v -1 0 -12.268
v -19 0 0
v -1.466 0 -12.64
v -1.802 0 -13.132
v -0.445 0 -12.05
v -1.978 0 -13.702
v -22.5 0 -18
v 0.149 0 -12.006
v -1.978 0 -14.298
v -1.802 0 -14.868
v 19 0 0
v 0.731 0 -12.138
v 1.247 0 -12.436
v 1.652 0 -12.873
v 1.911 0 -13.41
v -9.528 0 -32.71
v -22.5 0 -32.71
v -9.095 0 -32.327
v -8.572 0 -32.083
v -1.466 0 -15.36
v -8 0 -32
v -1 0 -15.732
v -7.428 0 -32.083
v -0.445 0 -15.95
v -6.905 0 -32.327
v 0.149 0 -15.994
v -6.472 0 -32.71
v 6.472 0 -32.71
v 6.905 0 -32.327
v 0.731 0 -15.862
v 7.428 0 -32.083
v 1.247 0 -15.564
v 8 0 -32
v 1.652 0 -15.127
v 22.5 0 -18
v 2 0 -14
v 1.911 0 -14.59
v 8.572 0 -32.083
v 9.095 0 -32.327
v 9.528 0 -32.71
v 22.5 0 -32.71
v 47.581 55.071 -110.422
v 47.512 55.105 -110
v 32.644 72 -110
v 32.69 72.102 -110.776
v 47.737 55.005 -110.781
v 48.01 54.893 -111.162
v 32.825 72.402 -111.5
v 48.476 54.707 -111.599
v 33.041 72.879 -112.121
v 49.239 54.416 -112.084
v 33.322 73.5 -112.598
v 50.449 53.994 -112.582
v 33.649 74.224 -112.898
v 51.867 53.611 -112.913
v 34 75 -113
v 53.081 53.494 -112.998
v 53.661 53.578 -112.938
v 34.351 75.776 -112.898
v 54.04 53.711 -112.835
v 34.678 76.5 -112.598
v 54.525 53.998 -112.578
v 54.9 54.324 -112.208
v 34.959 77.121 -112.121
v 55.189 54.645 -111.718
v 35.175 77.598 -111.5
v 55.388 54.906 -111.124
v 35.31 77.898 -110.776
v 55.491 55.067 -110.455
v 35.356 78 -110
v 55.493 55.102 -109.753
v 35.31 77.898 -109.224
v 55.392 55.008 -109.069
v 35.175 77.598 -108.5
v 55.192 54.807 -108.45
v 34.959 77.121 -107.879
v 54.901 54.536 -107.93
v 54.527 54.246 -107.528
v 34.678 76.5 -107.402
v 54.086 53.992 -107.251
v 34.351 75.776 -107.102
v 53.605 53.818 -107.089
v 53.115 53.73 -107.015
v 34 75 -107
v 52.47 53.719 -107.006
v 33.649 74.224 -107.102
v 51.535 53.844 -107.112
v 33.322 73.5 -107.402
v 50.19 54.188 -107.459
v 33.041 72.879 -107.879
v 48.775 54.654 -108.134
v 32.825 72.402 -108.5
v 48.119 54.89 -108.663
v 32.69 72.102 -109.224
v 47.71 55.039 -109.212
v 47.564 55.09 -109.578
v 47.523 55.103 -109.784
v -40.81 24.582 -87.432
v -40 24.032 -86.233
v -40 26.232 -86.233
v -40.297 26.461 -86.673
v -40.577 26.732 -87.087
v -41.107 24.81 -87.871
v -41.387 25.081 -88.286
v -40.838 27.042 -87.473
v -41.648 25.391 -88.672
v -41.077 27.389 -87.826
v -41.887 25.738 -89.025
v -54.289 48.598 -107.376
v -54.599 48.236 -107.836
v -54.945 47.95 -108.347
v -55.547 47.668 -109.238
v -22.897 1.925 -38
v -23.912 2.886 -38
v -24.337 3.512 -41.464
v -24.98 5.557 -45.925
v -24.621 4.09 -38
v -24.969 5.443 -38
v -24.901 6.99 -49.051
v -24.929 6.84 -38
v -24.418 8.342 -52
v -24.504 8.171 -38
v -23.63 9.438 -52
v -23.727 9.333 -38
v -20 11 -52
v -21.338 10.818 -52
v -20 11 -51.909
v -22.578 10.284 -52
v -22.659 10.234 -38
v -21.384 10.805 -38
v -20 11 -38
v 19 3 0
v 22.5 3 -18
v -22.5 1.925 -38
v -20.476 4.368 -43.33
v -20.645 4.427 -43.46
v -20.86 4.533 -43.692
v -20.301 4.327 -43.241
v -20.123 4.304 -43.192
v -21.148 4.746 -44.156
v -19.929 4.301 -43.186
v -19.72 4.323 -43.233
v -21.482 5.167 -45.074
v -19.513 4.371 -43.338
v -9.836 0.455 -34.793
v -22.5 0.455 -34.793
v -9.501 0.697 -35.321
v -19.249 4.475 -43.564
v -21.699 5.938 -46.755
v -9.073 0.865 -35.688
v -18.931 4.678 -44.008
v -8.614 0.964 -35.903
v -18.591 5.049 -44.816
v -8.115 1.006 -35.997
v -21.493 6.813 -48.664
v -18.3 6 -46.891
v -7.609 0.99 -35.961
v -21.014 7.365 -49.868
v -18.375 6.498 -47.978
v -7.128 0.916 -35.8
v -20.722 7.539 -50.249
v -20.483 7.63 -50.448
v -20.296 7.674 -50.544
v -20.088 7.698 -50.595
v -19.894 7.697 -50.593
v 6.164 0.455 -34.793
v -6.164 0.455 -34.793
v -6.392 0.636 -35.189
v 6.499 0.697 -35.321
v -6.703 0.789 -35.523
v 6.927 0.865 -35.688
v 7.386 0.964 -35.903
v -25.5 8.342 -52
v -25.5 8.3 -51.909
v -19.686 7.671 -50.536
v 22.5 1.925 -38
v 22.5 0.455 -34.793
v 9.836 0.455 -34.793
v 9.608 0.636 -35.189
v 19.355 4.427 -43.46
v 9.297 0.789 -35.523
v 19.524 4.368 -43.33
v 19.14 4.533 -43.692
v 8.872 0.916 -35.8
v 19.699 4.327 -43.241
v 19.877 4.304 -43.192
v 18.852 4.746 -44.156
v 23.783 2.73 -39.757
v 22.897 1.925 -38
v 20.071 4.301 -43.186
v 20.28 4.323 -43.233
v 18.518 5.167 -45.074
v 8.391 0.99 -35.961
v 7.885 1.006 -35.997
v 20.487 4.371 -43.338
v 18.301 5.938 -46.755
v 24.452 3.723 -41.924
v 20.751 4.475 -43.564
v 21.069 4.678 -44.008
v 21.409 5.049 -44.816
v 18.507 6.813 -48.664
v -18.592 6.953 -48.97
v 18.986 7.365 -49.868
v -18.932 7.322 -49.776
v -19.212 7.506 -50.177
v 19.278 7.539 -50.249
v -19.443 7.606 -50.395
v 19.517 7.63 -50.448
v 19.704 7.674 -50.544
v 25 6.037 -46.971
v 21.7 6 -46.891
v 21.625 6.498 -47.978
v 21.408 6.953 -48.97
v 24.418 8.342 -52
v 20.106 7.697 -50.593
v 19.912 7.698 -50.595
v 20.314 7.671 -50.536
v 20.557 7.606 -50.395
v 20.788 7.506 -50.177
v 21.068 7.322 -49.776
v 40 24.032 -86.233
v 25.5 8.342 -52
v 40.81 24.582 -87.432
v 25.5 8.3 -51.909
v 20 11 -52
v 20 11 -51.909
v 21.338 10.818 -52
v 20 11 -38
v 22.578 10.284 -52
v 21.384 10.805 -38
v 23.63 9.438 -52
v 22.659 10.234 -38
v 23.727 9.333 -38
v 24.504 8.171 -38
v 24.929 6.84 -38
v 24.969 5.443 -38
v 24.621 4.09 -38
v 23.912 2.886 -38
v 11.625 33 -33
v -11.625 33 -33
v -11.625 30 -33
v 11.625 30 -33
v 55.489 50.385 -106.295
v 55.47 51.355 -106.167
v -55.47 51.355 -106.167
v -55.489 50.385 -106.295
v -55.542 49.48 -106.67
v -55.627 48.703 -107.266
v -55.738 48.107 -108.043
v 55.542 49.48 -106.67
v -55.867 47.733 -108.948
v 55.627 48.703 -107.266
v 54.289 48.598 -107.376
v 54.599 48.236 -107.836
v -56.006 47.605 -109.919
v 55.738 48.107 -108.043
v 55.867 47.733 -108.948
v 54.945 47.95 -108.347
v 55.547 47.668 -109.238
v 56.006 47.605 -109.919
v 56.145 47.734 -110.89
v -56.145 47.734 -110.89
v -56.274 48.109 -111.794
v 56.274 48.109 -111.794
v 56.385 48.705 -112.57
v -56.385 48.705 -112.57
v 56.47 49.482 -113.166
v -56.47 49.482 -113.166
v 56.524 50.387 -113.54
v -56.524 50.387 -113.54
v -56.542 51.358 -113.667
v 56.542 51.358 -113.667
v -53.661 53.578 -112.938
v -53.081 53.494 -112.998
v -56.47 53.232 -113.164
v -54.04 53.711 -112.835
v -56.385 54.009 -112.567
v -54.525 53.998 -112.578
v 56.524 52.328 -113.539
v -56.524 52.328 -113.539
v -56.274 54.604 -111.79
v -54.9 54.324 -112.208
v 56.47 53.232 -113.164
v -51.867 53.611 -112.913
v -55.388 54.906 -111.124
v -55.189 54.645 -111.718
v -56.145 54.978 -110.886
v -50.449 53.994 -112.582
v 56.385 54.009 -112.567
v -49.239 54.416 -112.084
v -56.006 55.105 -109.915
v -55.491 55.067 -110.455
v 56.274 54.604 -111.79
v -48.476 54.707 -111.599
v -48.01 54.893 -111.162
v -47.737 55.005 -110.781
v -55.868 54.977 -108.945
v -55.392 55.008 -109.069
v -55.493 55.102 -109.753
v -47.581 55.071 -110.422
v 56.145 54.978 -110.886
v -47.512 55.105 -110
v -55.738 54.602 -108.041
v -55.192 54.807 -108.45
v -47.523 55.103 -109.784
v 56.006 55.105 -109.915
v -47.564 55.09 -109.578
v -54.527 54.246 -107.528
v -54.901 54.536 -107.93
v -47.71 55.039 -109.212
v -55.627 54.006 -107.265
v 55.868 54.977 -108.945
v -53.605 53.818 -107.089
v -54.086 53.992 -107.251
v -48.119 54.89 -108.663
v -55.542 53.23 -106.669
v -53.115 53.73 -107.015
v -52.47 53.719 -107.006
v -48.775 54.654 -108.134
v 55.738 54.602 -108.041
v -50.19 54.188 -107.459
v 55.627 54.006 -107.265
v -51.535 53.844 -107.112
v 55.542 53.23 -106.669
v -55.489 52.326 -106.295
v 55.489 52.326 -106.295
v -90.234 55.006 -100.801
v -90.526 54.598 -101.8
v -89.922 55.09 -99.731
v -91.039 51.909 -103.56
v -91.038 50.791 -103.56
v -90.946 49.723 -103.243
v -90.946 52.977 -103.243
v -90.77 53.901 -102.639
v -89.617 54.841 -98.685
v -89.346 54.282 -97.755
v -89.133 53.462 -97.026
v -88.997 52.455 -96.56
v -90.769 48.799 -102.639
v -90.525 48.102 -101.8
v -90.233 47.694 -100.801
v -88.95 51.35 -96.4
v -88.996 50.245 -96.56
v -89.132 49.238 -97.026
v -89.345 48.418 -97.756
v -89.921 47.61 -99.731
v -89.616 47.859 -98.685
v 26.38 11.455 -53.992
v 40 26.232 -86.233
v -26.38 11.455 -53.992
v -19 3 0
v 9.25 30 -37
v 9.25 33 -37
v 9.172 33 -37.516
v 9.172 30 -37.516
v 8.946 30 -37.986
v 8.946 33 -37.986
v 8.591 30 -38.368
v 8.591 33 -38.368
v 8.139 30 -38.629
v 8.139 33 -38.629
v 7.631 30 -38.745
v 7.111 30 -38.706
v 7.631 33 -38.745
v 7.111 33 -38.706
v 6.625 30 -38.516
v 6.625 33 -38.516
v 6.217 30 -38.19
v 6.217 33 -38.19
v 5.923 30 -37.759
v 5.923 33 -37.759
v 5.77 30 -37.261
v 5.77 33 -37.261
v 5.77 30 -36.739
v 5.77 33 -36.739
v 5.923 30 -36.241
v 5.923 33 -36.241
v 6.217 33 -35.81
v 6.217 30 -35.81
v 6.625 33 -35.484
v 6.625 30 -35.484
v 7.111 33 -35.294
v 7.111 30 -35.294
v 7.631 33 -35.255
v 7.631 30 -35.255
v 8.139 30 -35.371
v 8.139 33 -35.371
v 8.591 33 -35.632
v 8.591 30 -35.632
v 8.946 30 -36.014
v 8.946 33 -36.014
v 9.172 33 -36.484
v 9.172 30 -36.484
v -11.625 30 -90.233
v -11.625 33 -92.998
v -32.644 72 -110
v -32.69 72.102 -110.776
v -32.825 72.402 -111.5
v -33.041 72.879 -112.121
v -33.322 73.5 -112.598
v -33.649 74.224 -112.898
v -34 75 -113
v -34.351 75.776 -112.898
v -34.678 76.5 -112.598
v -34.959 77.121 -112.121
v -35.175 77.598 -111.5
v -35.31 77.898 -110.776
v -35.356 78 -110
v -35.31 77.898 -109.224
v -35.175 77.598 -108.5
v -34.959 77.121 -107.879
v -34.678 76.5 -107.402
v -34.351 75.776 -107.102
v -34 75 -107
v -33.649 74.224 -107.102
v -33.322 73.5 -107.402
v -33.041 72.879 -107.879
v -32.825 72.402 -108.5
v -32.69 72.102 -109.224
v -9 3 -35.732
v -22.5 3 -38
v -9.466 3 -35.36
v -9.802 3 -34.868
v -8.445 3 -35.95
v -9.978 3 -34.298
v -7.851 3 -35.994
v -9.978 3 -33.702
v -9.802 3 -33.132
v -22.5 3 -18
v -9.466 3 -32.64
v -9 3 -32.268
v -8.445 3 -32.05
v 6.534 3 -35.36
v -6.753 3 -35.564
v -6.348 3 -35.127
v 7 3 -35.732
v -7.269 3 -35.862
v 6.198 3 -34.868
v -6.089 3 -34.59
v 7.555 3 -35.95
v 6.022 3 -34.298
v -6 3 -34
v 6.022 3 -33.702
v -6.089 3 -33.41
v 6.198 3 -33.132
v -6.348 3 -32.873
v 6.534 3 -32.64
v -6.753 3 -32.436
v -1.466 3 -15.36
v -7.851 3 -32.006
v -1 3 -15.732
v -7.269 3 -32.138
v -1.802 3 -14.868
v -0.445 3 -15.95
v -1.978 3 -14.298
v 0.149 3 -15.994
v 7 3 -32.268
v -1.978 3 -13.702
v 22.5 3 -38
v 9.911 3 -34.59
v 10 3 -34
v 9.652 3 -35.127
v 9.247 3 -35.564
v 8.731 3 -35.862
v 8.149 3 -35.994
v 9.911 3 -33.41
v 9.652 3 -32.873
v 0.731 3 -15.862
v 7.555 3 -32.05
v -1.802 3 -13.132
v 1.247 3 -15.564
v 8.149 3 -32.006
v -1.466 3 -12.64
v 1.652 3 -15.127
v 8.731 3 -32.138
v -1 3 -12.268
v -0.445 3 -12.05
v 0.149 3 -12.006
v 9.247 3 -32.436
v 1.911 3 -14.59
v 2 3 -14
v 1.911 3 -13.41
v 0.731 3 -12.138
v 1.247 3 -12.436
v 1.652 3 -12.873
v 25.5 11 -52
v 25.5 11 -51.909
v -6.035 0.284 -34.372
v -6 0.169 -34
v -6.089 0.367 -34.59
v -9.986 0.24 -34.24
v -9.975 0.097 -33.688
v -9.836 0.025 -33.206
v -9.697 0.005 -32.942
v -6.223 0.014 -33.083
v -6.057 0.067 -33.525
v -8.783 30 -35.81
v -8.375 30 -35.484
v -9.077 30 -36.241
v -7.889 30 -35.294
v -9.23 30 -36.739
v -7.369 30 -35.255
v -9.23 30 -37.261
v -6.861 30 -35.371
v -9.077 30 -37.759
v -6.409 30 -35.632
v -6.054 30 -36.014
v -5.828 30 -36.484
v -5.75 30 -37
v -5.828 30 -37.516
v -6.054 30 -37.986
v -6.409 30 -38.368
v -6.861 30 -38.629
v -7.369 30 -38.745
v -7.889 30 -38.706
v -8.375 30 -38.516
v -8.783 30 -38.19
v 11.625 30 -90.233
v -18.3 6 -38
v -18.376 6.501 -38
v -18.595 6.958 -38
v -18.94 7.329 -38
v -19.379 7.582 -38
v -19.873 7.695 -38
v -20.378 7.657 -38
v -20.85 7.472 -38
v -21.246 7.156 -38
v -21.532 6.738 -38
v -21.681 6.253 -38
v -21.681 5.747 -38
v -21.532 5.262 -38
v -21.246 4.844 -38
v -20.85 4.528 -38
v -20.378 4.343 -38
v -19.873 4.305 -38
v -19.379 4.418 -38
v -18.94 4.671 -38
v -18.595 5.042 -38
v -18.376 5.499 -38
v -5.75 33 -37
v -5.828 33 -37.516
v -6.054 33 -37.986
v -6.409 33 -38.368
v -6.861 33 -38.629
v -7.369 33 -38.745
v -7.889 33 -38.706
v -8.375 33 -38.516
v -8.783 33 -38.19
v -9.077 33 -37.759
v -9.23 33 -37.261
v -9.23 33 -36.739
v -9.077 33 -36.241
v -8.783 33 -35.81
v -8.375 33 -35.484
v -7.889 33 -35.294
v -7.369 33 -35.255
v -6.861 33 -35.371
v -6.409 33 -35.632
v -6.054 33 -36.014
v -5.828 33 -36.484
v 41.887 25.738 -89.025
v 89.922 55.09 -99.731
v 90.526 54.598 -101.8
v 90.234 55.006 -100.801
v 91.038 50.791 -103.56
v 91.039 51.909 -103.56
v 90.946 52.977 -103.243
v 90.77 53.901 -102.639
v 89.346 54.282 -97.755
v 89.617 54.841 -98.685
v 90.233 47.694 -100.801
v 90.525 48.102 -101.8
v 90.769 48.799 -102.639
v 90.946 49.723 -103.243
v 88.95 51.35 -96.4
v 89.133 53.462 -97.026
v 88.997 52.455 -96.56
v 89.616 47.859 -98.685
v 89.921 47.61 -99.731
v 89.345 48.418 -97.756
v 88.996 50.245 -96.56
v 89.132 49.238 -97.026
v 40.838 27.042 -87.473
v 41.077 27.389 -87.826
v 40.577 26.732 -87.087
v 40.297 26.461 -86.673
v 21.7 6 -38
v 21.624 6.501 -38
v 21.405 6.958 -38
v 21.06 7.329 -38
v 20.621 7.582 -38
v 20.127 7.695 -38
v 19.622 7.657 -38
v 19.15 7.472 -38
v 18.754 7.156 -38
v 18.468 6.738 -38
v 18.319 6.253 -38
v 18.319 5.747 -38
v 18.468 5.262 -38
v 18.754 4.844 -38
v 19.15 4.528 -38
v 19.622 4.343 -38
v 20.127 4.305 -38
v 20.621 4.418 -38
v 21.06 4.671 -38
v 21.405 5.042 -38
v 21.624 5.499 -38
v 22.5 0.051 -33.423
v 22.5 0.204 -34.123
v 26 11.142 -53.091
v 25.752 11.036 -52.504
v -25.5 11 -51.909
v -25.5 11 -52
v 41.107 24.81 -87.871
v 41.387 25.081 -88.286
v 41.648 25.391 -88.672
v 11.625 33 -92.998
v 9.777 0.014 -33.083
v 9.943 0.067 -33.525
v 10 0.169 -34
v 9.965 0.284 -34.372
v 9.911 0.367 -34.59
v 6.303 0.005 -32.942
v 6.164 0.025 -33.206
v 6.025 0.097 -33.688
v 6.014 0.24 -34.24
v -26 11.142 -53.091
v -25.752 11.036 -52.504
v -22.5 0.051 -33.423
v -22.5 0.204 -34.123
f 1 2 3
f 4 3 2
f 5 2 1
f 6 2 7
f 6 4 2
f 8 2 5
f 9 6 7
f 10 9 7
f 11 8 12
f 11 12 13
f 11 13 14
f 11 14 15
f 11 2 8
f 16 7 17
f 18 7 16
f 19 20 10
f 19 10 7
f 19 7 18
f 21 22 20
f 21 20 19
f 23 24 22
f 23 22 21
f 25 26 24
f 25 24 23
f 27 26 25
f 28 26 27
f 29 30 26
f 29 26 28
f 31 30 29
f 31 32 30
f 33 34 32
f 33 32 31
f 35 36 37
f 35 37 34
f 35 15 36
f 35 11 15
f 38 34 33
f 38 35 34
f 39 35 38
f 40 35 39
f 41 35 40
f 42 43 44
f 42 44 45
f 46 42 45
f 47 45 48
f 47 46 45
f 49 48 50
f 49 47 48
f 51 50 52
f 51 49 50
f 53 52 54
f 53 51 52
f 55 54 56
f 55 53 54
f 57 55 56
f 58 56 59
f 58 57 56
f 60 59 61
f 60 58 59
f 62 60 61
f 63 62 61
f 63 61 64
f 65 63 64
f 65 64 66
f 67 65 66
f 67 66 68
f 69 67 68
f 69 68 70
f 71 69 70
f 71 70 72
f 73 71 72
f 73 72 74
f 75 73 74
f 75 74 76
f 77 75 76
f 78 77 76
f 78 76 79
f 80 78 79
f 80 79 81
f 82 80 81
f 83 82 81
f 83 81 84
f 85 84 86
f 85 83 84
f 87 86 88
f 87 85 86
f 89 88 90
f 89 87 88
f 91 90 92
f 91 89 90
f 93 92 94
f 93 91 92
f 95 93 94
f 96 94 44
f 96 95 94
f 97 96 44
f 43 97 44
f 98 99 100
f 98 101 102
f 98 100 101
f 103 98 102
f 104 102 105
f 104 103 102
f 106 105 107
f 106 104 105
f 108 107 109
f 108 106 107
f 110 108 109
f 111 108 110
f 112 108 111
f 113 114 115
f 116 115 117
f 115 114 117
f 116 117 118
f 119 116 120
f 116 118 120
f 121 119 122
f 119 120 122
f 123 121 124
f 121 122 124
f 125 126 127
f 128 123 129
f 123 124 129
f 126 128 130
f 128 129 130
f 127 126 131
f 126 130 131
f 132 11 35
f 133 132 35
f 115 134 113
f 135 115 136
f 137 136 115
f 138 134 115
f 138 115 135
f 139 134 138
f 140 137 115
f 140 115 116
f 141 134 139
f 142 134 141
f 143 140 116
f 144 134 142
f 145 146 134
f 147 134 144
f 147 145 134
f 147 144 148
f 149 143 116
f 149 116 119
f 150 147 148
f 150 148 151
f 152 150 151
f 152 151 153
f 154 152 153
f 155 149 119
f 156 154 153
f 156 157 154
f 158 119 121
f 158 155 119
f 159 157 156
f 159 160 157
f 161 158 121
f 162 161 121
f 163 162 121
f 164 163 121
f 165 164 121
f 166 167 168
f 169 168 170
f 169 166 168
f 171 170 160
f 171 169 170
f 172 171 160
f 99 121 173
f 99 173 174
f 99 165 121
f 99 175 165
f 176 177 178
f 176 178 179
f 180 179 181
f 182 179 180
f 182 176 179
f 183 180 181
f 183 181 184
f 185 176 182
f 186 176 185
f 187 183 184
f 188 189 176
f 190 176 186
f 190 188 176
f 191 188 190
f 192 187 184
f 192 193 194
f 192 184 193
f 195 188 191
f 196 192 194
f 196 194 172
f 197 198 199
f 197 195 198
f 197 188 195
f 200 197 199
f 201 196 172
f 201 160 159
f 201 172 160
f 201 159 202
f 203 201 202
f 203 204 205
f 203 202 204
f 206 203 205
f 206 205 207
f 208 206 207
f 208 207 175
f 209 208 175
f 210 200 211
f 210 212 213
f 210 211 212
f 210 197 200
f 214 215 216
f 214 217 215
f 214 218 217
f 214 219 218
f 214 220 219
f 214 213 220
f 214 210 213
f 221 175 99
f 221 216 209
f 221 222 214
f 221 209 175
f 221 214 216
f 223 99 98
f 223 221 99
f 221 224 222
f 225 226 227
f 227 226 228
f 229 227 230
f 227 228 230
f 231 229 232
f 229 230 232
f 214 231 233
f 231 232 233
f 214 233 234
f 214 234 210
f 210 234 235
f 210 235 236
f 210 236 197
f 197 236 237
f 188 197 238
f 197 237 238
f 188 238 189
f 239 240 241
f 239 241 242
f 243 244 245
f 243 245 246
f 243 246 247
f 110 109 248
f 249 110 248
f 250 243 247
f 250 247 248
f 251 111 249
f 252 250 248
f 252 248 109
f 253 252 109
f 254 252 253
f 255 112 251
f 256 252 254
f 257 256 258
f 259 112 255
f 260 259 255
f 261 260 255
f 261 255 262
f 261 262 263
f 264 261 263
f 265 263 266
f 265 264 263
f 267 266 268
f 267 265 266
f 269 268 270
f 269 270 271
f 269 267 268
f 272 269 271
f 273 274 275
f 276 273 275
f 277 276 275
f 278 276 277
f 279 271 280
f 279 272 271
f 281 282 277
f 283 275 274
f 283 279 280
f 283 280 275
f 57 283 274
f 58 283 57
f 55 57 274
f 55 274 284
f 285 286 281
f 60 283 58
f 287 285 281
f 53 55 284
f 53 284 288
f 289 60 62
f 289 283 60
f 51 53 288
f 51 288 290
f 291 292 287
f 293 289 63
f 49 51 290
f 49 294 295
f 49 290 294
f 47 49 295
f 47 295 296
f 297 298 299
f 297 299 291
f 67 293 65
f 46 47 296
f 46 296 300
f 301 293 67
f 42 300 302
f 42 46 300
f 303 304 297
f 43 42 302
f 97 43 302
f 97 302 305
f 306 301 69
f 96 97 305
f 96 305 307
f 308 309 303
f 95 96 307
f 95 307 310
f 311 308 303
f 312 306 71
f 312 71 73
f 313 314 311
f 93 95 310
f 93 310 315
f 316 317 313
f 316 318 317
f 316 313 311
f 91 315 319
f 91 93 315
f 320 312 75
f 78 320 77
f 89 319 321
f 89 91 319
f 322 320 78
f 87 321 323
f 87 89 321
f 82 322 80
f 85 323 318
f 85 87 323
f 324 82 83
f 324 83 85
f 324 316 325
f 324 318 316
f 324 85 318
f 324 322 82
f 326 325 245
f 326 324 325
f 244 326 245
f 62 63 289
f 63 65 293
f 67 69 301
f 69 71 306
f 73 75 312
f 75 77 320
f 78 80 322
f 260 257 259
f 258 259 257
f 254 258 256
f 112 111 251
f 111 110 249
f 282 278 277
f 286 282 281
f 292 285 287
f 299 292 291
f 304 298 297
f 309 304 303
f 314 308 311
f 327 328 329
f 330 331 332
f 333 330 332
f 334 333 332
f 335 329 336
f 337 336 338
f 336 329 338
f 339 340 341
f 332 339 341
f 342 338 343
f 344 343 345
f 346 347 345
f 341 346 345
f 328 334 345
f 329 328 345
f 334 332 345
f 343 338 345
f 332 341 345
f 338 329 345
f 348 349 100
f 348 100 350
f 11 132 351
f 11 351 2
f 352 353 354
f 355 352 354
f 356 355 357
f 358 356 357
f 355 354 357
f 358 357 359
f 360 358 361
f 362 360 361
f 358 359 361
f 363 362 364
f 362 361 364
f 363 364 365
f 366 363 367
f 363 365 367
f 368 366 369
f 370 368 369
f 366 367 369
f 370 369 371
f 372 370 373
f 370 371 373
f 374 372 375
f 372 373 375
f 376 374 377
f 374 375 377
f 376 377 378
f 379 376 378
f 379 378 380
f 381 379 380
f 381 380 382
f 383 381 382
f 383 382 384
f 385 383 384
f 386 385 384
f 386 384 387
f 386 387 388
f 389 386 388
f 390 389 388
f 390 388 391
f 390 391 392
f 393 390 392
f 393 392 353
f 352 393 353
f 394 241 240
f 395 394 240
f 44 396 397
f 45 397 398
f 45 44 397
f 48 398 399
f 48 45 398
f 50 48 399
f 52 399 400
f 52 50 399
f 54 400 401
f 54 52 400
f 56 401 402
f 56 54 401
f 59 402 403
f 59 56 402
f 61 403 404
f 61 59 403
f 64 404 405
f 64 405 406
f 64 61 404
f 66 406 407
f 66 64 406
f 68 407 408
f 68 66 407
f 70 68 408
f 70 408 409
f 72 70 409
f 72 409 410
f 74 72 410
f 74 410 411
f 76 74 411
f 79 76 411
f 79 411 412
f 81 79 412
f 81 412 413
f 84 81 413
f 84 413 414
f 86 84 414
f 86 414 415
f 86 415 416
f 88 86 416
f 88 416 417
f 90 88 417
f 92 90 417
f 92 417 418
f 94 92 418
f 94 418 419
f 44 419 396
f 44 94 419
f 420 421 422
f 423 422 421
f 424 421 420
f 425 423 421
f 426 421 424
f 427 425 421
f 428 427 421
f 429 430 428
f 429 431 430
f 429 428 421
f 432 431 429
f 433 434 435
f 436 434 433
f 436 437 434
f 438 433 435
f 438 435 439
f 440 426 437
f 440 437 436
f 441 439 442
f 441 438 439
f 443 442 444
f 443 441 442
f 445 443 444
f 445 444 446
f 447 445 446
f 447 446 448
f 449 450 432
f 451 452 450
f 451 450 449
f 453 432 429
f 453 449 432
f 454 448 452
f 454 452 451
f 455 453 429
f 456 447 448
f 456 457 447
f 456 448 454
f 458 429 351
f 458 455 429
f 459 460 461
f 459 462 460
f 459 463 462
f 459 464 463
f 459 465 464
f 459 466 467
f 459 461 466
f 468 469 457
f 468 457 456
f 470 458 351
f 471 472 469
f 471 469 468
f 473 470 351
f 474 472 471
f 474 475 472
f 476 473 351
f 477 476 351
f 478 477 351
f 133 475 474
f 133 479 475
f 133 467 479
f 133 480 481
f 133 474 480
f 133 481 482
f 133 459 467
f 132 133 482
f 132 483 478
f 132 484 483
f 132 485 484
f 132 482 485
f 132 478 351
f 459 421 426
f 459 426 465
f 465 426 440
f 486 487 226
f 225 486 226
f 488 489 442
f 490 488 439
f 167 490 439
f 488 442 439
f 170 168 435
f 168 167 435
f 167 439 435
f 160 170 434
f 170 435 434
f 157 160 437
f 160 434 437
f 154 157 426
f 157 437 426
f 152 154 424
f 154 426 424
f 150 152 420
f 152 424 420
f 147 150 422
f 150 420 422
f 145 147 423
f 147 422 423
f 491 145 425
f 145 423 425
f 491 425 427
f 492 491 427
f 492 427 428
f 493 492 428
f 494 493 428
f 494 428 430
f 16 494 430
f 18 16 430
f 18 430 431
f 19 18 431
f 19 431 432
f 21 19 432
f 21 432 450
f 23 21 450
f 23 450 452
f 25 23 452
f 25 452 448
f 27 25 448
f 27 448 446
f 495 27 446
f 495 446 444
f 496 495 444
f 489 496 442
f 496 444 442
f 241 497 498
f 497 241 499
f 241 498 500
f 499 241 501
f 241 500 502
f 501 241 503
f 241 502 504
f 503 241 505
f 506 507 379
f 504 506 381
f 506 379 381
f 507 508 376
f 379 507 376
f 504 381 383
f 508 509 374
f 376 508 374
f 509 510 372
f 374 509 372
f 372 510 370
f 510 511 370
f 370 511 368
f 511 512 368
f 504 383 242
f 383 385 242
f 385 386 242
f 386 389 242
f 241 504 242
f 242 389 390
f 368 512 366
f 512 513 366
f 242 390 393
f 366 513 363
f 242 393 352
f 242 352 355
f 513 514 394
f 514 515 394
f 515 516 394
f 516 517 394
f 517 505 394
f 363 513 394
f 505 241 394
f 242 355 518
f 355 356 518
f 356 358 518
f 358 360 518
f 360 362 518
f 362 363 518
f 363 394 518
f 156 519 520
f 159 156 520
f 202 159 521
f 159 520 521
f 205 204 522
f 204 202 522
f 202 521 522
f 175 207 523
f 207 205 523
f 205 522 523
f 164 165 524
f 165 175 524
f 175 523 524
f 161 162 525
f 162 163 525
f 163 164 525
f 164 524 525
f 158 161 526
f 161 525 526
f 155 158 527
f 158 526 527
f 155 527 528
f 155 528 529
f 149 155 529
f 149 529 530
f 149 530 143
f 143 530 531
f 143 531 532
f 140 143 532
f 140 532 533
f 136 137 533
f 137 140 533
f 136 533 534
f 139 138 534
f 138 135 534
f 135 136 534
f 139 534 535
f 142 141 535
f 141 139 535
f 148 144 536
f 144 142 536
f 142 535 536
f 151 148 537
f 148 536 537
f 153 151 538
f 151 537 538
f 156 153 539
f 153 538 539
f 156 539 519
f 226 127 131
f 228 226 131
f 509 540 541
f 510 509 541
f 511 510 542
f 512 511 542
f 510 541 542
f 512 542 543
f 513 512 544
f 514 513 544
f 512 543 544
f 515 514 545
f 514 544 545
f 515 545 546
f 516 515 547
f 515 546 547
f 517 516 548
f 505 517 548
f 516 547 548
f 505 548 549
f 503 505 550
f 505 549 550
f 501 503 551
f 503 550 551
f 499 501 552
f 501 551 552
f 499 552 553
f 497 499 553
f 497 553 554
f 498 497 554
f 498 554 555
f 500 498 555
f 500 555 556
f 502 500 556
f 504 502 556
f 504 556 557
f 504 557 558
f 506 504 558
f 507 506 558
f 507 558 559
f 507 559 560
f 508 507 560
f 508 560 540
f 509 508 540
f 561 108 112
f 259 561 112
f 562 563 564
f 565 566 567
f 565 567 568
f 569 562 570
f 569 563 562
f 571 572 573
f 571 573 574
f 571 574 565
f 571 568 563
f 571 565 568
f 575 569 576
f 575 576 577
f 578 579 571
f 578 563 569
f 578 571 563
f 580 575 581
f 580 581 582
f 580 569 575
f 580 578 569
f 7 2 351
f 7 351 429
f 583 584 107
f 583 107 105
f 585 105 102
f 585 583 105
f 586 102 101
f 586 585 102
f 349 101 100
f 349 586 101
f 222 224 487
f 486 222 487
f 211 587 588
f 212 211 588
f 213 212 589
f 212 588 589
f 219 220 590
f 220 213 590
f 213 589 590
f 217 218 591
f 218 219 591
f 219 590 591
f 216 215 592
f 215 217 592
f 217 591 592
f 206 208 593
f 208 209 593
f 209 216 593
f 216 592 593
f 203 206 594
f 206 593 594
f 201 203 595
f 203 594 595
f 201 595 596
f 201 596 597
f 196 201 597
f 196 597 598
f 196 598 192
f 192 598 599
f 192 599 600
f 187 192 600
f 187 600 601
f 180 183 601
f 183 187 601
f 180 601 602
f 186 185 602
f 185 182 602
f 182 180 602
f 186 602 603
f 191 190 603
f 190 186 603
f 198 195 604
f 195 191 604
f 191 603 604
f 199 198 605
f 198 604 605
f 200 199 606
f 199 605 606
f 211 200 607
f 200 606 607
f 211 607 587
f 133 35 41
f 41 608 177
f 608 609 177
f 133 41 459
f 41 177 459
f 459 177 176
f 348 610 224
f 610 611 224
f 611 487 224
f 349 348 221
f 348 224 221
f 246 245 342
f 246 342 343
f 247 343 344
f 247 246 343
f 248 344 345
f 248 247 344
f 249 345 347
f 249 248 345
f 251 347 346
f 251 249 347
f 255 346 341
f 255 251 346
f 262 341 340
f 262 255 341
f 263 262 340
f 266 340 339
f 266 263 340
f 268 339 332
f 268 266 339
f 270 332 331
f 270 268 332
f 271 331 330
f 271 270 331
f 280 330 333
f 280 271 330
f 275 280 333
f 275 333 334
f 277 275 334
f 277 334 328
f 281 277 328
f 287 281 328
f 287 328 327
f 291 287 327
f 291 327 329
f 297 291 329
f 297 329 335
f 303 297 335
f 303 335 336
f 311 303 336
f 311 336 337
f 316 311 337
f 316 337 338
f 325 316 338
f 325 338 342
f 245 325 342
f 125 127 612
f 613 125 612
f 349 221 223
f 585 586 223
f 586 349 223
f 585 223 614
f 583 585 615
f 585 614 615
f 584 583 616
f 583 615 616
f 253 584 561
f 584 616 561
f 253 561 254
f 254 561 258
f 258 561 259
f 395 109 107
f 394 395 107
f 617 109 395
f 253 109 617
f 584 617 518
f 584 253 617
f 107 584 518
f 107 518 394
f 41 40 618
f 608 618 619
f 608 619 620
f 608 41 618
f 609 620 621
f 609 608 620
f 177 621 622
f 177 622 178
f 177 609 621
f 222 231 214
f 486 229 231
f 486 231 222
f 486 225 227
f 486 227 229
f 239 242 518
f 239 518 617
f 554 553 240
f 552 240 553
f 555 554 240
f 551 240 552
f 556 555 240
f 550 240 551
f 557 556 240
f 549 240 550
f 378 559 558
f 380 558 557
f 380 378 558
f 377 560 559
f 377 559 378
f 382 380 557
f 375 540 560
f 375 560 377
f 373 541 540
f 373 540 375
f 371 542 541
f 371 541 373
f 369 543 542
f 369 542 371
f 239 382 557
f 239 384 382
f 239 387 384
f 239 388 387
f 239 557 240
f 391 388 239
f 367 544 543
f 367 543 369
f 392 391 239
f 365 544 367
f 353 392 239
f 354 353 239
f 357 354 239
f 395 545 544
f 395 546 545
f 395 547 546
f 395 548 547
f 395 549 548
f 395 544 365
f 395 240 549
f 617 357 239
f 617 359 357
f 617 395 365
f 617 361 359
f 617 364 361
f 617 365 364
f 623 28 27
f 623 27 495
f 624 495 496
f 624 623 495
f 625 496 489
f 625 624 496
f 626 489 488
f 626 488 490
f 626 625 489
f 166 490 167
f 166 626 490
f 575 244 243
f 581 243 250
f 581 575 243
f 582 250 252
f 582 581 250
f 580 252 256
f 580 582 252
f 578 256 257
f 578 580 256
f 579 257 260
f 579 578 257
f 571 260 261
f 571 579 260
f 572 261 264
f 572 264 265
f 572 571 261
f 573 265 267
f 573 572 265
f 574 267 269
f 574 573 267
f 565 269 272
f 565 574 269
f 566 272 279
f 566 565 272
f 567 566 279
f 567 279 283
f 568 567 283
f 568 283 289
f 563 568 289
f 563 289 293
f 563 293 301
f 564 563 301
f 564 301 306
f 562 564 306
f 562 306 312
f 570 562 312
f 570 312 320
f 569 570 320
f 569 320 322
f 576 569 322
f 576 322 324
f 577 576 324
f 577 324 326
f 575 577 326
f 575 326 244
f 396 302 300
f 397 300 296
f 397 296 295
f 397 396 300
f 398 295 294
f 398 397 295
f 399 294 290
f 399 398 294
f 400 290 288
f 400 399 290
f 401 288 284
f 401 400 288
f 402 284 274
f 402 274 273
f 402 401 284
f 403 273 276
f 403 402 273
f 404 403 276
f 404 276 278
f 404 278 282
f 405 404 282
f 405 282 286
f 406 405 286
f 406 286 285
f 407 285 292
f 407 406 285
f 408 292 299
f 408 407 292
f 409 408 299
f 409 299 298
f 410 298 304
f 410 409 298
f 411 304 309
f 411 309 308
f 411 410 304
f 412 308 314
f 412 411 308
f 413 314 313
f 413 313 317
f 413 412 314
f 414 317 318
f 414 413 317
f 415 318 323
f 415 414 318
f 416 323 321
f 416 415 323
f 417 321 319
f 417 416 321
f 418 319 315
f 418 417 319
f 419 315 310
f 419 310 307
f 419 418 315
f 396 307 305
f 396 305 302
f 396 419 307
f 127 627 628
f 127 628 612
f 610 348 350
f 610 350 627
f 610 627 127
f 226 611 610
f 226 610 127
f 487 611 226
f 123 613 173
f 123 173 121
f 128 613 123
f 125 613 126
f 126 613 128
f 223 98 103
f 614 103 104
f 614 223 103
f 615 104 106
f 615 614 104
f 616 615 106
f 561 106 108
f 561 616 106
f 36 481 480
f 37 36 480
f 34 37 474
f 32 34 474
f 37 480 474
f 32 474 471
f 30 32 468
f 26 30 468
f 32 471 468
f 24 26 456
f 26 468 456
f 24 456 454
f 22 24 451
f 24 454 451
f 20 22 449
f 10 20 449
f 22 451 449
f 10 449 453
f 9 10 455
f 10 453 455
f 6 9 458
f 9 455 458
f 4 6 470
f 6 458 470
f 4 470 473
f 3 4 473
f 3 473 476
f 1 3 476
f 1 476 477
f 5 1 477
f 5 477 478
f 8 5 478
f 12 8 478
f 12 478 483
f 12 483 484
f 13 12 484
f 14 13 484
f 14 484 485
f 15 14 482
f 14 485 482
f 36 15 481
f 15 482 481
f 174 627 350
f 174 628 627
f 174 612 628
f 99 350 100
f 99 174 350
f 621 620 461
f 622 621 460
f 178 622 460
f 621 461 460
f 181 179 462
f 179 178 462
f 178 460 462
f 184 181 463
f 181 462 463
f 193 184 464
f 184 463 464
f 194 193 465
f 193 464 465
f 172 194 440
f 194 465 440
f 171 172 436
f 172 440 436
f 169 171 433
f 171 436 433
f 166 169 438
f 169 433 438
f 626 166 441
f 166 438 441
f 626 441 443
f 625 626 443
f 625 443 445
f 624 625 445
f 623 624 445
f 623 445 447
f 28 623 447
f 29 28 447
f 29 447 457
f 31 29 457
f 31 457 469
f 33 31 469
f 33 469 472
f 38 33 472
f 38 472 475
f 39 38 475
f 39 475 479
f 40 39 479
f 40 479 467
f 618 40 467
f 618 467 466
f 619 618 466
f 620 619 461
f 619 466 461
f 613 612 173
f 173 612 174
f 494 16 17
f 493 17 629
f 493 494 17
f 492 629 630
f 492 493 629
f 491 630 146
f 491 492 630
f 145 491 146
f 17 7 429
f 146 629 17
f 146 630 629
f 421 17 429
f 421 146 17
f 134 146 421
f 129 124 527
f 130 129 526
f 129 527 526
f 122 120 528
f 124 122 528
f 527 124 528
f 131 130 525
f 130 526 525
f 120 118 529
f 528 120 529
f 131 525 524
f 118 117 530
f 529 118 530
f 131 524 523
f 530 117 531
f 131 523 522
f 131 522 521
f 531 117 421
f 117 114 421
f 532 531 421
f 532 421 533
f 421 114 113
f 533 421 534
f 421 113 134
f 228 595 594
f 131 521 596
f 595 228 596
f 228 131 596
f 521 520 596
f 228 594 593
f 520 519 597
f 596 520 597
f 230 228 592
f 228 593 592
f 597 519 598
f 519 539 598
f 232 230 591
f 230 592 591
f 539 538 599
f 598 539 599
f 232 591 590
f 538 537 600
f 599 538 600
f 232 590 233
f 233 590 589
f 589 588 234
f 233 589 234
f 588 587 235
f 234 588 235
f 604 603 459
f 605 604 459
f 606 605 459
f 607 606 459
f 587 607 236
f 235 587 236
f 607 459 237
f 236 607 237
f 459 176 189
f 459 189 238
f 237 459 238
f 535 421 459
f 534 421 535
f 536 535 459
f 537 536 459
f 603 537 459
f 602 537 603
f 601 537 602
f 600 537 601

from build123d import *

# Parameters (mm, degrees)
BOSS_EXTRUDE1_DEPTH             = 57
SKETCH18_R                      = 2
CUT_EXTRUDE3_DEPTH              = 3
CUT_EXTRUDE5_DEPTH              = 60
CUT_EXTRUDE5_DEPTH_BACK         = 1.0000001
SKETCH24_R                      = 1.7
CUT_EXTRUDE6_DEPTH              = 14
SWEEP1_PROFILE_R                = 3.75
SWEEP2_PROFILE_R                = 3
BOSS_EXTRUDE2_REACH             = 77.667
SKETCH19_W                      = 23.25
SKETCH19_H                      = 3
BOSS_EXTRUDE2_DIRECTION_2_DEPTH = 5
CUT_EXTRUDE8_REACH              = 35
SKETCH54_R                      = 1.75


with BuildPart() as part:
    # Sketch2 → Boss-Extrude1 (new body, symmetric)
    with BuildSketch(Plane(origin=(0, 0, 0), x_dir=(0, 0, -1), z_dir=(1, 0, 0))):
        with BuildLine():
            Line((0, 0), (32.709545462, 0))
            ThreePointArc((32.709545462, 0), (33.775734101, 0.114998282), (34.792878796, 0.454703286))
            Line((34.792878796, 0.454703286), (87.43170835, 24.581671255))
            ThreePointArc((87.43170835, 24.581671255), (88.285761732, 25.080764899), (89.024845605, 25.738227198))
            Line((89.024845605, 25.738227198), (111.387831165, 50))
            Line((111.387831165, 50), (109.917242929, 51.355496308))
            Line((109.917242929, 51.355496308), (87.826438044, 27.389014385))
            ThreePointArc((87.826438044, 27.389014385), (87.087354171, 26.731552087), (86.233300789, 26.232458442))
            Line((86.233300789, 26.232458442), (53.992045448, 11.454703286))
            ThreePointArc((53.992045448, 11.454703286), (52.974900754, 11.114998282), (51.908712115, 11))
            Line((51.908712115, 11), (38, 11))
            Line((38, 11), (38, 3))
            Line((38, 3), (0, 3))
            Line((0, 3), (0, 0))
        make_face()
    extrude(amount=BOSS_EXTRUDE1_DEPTH, both=True)

    # Sketch18 → Cut-Extrude3 (cut)
    with BuildSketch(Plane(origin=(0, 3, 0), x_dir=(1, 0, 0), z_dir=(0, 1, 0))):
        with Locations((-8, 34)):
            Circle(SKETCH18_R)
        with Locations((8, 34)):
            Circle(SKETCH18_R)
        with Locations((0, 14)):
            Circle(SKETCH18_R)
    extrude(amount=-CUT_EXTRUDE3_DEPTH, mode=Mode.SUBTRACT)

    # Sketch23 → Cut-Extrude5 (cut, two sides)
    with BuildSketch(Plane(origin=(0, 0, 0), x_dir=(1, 0, 0), z_dir=(0, 1, 0))) as cut_extrude5_sk:
        Polygon((19, 0), (22.5, 18), (22.5, 38), (25.5, 38), (25.5, 51.908712115), (40, 86.233300789), (57, 111.387831165), (57, 0), align=None)
        Polygon((-57, 0), (-19, 0), (-22.5, 18), (-22.5, 38), (-25.5, 38), (-25.5, 51.908712115), (-40, 86.233300789), (-57, 111.387831165), align=None)
    extrude(amount=CUT_EXTRUDE5_DEPTH, mode=Mode.SUBTRACT)
    extrude(cut_extrude5_sk.sketch, amount=-CUT_EXTRUDE5_DEPTH_BACK, mode=Mode.SUBTRACT)

    # Sketch24 → Cut-Extrude6 (cut)
    with BuildSketch(Plane.XY.offset(-38)):
        with Locations((-20, 6)):
            Circle(SKETCH24_R)
        with Locations((20, 6)):
            Circle(SKETCH24_R)
        with BuildLine():
            Line((-20, 11), (-25.5, 11))
            Line((-25.5, 11), (-25.5, 1.924684879))
            Line((-25.5, 1.924684879), (-22.89686152, 1.924684879))
            ThreePointArc((-22.89686152, 1.924684879), (-24.763222418, 7.520431583), (-20, 11))
        make_face()
        with BuildLine():
            Line((22.89686152, 1.924684879), (25.5, 1.924684879))
            Line((25.5, 1.924684879), (25.5, 11))
            Line((25.5, 11), (20, 11))
            ThreePointArc((20, 11), (24.763222418, 7.520431583), (22.89686152, 1.924684879))
        make_face()
    extrude(amount=-CUT_EXTRUDE6_DEPTH, mode=Mode.SUBTRACT)

    # Sweep1: sweep along a curve in space
    with BuildLine() as sweep1_path:
        Line((-90, 51.35, -100), (-56.006143242, 51.355496308, -109.917242929))
        Line((-56.006143242, 51.355496308, -109.917242929), (56.006143242, 51.355496308, -109.917242929))
        Line((56.006143242, 51.355496308, -109.917242929), (90, 51.35, -100))
    # Sweep1 profile (on start of the path) → Sweep1 (sweep)
    with BuildSketch(Plane(origin=(-90, 51.35, -100), x_dir=(0.28006163, 0, 0.959982023), z_dir=(0.959982011, 0.000155215, -0.280061626))):
        Circle(SWEEP1_PROFILE_R)
    sweep(path=sweep1_path.line, transition=Transition.RIGHT)

    # Sweep2: sweep along a curve in space
    with BuildLine() as sweep2_path:
        Line((-56, 50, -110), (-34, 75, -110))
        Line((-34, 75, -110), (34, 75, -110))
        Line((34, 75, -110), (56, 50, -110))
    # Sweep2 profile (on start of the path) → Sweep2 (sweep)
    with BuildSketch(Plane(origin=(-56, 50, -110), x_dir=(0.750713517, -0.660627895, 0), z_dir=(0.660627895, 0.750713517, 0))):
        Circle(SWEEP2_PROFILE_R)
    sweep(path=sweep2_path.line, transition=Transition.RIGHT)

    # Boss-Extrude2: up to this face of the body (flat: up to its plane)
    boss_extrude2_end = Plane(part.part.faces().sort_by_distance((0, 38.483295154, -98.05245255))[0])
    # Sketch19 → Boss-Extrude2 (add, up to the picked face)
    with BuildSketch(Plane.XY.offset(-38), mode=Mode.PRIVATE) as boss_extrude2_sk1:
        with Locations((0, 31.5)):
            Rectangle(SKETCH19_W, SKETCH19_H)
    boss_extrude2_tool1 = split(extrude(boss_extrude2_sk1.sketch, amount=-BOSS_EXTRUDE2_REACH, mode=Mode.PRIVATE), bisect_by=boss_extrude2_end, keep=Keep.BOTH, mode=Mode.PRIVATE)
    add(boss_extrude2_tool1.solids().sort_by_distance((0, 31.5, -38))[0])

    # Sketch19 → Boss-Extrude2 direction 2 (add)
    with BuildSketch(Plane.XY.offset(-38)):
        with Locations((0, 31.5)):
            Rectangle(SKETCH19_W, SKETCH19_H)
    extrude(amount=BOSS_EXTRUDE2_DIRECTION_2_DEPTH)

    # Sketch54 → Cut-Extrude8 (cut, up to next)
    with BuildSketch(Plane(origin=(0, 33, 0), x_dir=(1, 0, 0), z_dir=(0, 1, 0)), mode=Mode.PRIVATE) as cut_extrude8_sk1:
        with Locations((-7.5, 37)):
            Circle(SKETCH54_R)
    cut_extrude8_tool1 = extrude(cut_extrude8_sk1.sketch, amount=-CUT_EXTRUDE8_REACH, mode=Mode.PRIVATE) & part.part
    add(cut_extrude8_tool1.solids().sort_by_distance((-7.5, 33, -37))[0], mode=Mode.SUBTRACT)
    # Sketch54 → Cut-Extrude8 (cut, up to next)
    with BuildSketch(Plane(origin=(0, 33, 0), x_dir=(1, 0, 0), z_dir=(0, 1, 0)), mode=Mode.PRIVATE) as cut_extrude8_sk2:
        with Locations((7.5, 37)):
            Circle(SKETCH54_R)
    cut_extrude8_tool2 = extrude(cut_extrude8_sk2.sketch, amount=-CUT_EXTRUDE8_REACH, mode=Mode.PRIVATE) & part.part
    add(cut_extrude8_tool2.solids().sort_by_distance((7.5, 33, -37))[0], mode=Mode.SUBTRACT)


solid = part.part
